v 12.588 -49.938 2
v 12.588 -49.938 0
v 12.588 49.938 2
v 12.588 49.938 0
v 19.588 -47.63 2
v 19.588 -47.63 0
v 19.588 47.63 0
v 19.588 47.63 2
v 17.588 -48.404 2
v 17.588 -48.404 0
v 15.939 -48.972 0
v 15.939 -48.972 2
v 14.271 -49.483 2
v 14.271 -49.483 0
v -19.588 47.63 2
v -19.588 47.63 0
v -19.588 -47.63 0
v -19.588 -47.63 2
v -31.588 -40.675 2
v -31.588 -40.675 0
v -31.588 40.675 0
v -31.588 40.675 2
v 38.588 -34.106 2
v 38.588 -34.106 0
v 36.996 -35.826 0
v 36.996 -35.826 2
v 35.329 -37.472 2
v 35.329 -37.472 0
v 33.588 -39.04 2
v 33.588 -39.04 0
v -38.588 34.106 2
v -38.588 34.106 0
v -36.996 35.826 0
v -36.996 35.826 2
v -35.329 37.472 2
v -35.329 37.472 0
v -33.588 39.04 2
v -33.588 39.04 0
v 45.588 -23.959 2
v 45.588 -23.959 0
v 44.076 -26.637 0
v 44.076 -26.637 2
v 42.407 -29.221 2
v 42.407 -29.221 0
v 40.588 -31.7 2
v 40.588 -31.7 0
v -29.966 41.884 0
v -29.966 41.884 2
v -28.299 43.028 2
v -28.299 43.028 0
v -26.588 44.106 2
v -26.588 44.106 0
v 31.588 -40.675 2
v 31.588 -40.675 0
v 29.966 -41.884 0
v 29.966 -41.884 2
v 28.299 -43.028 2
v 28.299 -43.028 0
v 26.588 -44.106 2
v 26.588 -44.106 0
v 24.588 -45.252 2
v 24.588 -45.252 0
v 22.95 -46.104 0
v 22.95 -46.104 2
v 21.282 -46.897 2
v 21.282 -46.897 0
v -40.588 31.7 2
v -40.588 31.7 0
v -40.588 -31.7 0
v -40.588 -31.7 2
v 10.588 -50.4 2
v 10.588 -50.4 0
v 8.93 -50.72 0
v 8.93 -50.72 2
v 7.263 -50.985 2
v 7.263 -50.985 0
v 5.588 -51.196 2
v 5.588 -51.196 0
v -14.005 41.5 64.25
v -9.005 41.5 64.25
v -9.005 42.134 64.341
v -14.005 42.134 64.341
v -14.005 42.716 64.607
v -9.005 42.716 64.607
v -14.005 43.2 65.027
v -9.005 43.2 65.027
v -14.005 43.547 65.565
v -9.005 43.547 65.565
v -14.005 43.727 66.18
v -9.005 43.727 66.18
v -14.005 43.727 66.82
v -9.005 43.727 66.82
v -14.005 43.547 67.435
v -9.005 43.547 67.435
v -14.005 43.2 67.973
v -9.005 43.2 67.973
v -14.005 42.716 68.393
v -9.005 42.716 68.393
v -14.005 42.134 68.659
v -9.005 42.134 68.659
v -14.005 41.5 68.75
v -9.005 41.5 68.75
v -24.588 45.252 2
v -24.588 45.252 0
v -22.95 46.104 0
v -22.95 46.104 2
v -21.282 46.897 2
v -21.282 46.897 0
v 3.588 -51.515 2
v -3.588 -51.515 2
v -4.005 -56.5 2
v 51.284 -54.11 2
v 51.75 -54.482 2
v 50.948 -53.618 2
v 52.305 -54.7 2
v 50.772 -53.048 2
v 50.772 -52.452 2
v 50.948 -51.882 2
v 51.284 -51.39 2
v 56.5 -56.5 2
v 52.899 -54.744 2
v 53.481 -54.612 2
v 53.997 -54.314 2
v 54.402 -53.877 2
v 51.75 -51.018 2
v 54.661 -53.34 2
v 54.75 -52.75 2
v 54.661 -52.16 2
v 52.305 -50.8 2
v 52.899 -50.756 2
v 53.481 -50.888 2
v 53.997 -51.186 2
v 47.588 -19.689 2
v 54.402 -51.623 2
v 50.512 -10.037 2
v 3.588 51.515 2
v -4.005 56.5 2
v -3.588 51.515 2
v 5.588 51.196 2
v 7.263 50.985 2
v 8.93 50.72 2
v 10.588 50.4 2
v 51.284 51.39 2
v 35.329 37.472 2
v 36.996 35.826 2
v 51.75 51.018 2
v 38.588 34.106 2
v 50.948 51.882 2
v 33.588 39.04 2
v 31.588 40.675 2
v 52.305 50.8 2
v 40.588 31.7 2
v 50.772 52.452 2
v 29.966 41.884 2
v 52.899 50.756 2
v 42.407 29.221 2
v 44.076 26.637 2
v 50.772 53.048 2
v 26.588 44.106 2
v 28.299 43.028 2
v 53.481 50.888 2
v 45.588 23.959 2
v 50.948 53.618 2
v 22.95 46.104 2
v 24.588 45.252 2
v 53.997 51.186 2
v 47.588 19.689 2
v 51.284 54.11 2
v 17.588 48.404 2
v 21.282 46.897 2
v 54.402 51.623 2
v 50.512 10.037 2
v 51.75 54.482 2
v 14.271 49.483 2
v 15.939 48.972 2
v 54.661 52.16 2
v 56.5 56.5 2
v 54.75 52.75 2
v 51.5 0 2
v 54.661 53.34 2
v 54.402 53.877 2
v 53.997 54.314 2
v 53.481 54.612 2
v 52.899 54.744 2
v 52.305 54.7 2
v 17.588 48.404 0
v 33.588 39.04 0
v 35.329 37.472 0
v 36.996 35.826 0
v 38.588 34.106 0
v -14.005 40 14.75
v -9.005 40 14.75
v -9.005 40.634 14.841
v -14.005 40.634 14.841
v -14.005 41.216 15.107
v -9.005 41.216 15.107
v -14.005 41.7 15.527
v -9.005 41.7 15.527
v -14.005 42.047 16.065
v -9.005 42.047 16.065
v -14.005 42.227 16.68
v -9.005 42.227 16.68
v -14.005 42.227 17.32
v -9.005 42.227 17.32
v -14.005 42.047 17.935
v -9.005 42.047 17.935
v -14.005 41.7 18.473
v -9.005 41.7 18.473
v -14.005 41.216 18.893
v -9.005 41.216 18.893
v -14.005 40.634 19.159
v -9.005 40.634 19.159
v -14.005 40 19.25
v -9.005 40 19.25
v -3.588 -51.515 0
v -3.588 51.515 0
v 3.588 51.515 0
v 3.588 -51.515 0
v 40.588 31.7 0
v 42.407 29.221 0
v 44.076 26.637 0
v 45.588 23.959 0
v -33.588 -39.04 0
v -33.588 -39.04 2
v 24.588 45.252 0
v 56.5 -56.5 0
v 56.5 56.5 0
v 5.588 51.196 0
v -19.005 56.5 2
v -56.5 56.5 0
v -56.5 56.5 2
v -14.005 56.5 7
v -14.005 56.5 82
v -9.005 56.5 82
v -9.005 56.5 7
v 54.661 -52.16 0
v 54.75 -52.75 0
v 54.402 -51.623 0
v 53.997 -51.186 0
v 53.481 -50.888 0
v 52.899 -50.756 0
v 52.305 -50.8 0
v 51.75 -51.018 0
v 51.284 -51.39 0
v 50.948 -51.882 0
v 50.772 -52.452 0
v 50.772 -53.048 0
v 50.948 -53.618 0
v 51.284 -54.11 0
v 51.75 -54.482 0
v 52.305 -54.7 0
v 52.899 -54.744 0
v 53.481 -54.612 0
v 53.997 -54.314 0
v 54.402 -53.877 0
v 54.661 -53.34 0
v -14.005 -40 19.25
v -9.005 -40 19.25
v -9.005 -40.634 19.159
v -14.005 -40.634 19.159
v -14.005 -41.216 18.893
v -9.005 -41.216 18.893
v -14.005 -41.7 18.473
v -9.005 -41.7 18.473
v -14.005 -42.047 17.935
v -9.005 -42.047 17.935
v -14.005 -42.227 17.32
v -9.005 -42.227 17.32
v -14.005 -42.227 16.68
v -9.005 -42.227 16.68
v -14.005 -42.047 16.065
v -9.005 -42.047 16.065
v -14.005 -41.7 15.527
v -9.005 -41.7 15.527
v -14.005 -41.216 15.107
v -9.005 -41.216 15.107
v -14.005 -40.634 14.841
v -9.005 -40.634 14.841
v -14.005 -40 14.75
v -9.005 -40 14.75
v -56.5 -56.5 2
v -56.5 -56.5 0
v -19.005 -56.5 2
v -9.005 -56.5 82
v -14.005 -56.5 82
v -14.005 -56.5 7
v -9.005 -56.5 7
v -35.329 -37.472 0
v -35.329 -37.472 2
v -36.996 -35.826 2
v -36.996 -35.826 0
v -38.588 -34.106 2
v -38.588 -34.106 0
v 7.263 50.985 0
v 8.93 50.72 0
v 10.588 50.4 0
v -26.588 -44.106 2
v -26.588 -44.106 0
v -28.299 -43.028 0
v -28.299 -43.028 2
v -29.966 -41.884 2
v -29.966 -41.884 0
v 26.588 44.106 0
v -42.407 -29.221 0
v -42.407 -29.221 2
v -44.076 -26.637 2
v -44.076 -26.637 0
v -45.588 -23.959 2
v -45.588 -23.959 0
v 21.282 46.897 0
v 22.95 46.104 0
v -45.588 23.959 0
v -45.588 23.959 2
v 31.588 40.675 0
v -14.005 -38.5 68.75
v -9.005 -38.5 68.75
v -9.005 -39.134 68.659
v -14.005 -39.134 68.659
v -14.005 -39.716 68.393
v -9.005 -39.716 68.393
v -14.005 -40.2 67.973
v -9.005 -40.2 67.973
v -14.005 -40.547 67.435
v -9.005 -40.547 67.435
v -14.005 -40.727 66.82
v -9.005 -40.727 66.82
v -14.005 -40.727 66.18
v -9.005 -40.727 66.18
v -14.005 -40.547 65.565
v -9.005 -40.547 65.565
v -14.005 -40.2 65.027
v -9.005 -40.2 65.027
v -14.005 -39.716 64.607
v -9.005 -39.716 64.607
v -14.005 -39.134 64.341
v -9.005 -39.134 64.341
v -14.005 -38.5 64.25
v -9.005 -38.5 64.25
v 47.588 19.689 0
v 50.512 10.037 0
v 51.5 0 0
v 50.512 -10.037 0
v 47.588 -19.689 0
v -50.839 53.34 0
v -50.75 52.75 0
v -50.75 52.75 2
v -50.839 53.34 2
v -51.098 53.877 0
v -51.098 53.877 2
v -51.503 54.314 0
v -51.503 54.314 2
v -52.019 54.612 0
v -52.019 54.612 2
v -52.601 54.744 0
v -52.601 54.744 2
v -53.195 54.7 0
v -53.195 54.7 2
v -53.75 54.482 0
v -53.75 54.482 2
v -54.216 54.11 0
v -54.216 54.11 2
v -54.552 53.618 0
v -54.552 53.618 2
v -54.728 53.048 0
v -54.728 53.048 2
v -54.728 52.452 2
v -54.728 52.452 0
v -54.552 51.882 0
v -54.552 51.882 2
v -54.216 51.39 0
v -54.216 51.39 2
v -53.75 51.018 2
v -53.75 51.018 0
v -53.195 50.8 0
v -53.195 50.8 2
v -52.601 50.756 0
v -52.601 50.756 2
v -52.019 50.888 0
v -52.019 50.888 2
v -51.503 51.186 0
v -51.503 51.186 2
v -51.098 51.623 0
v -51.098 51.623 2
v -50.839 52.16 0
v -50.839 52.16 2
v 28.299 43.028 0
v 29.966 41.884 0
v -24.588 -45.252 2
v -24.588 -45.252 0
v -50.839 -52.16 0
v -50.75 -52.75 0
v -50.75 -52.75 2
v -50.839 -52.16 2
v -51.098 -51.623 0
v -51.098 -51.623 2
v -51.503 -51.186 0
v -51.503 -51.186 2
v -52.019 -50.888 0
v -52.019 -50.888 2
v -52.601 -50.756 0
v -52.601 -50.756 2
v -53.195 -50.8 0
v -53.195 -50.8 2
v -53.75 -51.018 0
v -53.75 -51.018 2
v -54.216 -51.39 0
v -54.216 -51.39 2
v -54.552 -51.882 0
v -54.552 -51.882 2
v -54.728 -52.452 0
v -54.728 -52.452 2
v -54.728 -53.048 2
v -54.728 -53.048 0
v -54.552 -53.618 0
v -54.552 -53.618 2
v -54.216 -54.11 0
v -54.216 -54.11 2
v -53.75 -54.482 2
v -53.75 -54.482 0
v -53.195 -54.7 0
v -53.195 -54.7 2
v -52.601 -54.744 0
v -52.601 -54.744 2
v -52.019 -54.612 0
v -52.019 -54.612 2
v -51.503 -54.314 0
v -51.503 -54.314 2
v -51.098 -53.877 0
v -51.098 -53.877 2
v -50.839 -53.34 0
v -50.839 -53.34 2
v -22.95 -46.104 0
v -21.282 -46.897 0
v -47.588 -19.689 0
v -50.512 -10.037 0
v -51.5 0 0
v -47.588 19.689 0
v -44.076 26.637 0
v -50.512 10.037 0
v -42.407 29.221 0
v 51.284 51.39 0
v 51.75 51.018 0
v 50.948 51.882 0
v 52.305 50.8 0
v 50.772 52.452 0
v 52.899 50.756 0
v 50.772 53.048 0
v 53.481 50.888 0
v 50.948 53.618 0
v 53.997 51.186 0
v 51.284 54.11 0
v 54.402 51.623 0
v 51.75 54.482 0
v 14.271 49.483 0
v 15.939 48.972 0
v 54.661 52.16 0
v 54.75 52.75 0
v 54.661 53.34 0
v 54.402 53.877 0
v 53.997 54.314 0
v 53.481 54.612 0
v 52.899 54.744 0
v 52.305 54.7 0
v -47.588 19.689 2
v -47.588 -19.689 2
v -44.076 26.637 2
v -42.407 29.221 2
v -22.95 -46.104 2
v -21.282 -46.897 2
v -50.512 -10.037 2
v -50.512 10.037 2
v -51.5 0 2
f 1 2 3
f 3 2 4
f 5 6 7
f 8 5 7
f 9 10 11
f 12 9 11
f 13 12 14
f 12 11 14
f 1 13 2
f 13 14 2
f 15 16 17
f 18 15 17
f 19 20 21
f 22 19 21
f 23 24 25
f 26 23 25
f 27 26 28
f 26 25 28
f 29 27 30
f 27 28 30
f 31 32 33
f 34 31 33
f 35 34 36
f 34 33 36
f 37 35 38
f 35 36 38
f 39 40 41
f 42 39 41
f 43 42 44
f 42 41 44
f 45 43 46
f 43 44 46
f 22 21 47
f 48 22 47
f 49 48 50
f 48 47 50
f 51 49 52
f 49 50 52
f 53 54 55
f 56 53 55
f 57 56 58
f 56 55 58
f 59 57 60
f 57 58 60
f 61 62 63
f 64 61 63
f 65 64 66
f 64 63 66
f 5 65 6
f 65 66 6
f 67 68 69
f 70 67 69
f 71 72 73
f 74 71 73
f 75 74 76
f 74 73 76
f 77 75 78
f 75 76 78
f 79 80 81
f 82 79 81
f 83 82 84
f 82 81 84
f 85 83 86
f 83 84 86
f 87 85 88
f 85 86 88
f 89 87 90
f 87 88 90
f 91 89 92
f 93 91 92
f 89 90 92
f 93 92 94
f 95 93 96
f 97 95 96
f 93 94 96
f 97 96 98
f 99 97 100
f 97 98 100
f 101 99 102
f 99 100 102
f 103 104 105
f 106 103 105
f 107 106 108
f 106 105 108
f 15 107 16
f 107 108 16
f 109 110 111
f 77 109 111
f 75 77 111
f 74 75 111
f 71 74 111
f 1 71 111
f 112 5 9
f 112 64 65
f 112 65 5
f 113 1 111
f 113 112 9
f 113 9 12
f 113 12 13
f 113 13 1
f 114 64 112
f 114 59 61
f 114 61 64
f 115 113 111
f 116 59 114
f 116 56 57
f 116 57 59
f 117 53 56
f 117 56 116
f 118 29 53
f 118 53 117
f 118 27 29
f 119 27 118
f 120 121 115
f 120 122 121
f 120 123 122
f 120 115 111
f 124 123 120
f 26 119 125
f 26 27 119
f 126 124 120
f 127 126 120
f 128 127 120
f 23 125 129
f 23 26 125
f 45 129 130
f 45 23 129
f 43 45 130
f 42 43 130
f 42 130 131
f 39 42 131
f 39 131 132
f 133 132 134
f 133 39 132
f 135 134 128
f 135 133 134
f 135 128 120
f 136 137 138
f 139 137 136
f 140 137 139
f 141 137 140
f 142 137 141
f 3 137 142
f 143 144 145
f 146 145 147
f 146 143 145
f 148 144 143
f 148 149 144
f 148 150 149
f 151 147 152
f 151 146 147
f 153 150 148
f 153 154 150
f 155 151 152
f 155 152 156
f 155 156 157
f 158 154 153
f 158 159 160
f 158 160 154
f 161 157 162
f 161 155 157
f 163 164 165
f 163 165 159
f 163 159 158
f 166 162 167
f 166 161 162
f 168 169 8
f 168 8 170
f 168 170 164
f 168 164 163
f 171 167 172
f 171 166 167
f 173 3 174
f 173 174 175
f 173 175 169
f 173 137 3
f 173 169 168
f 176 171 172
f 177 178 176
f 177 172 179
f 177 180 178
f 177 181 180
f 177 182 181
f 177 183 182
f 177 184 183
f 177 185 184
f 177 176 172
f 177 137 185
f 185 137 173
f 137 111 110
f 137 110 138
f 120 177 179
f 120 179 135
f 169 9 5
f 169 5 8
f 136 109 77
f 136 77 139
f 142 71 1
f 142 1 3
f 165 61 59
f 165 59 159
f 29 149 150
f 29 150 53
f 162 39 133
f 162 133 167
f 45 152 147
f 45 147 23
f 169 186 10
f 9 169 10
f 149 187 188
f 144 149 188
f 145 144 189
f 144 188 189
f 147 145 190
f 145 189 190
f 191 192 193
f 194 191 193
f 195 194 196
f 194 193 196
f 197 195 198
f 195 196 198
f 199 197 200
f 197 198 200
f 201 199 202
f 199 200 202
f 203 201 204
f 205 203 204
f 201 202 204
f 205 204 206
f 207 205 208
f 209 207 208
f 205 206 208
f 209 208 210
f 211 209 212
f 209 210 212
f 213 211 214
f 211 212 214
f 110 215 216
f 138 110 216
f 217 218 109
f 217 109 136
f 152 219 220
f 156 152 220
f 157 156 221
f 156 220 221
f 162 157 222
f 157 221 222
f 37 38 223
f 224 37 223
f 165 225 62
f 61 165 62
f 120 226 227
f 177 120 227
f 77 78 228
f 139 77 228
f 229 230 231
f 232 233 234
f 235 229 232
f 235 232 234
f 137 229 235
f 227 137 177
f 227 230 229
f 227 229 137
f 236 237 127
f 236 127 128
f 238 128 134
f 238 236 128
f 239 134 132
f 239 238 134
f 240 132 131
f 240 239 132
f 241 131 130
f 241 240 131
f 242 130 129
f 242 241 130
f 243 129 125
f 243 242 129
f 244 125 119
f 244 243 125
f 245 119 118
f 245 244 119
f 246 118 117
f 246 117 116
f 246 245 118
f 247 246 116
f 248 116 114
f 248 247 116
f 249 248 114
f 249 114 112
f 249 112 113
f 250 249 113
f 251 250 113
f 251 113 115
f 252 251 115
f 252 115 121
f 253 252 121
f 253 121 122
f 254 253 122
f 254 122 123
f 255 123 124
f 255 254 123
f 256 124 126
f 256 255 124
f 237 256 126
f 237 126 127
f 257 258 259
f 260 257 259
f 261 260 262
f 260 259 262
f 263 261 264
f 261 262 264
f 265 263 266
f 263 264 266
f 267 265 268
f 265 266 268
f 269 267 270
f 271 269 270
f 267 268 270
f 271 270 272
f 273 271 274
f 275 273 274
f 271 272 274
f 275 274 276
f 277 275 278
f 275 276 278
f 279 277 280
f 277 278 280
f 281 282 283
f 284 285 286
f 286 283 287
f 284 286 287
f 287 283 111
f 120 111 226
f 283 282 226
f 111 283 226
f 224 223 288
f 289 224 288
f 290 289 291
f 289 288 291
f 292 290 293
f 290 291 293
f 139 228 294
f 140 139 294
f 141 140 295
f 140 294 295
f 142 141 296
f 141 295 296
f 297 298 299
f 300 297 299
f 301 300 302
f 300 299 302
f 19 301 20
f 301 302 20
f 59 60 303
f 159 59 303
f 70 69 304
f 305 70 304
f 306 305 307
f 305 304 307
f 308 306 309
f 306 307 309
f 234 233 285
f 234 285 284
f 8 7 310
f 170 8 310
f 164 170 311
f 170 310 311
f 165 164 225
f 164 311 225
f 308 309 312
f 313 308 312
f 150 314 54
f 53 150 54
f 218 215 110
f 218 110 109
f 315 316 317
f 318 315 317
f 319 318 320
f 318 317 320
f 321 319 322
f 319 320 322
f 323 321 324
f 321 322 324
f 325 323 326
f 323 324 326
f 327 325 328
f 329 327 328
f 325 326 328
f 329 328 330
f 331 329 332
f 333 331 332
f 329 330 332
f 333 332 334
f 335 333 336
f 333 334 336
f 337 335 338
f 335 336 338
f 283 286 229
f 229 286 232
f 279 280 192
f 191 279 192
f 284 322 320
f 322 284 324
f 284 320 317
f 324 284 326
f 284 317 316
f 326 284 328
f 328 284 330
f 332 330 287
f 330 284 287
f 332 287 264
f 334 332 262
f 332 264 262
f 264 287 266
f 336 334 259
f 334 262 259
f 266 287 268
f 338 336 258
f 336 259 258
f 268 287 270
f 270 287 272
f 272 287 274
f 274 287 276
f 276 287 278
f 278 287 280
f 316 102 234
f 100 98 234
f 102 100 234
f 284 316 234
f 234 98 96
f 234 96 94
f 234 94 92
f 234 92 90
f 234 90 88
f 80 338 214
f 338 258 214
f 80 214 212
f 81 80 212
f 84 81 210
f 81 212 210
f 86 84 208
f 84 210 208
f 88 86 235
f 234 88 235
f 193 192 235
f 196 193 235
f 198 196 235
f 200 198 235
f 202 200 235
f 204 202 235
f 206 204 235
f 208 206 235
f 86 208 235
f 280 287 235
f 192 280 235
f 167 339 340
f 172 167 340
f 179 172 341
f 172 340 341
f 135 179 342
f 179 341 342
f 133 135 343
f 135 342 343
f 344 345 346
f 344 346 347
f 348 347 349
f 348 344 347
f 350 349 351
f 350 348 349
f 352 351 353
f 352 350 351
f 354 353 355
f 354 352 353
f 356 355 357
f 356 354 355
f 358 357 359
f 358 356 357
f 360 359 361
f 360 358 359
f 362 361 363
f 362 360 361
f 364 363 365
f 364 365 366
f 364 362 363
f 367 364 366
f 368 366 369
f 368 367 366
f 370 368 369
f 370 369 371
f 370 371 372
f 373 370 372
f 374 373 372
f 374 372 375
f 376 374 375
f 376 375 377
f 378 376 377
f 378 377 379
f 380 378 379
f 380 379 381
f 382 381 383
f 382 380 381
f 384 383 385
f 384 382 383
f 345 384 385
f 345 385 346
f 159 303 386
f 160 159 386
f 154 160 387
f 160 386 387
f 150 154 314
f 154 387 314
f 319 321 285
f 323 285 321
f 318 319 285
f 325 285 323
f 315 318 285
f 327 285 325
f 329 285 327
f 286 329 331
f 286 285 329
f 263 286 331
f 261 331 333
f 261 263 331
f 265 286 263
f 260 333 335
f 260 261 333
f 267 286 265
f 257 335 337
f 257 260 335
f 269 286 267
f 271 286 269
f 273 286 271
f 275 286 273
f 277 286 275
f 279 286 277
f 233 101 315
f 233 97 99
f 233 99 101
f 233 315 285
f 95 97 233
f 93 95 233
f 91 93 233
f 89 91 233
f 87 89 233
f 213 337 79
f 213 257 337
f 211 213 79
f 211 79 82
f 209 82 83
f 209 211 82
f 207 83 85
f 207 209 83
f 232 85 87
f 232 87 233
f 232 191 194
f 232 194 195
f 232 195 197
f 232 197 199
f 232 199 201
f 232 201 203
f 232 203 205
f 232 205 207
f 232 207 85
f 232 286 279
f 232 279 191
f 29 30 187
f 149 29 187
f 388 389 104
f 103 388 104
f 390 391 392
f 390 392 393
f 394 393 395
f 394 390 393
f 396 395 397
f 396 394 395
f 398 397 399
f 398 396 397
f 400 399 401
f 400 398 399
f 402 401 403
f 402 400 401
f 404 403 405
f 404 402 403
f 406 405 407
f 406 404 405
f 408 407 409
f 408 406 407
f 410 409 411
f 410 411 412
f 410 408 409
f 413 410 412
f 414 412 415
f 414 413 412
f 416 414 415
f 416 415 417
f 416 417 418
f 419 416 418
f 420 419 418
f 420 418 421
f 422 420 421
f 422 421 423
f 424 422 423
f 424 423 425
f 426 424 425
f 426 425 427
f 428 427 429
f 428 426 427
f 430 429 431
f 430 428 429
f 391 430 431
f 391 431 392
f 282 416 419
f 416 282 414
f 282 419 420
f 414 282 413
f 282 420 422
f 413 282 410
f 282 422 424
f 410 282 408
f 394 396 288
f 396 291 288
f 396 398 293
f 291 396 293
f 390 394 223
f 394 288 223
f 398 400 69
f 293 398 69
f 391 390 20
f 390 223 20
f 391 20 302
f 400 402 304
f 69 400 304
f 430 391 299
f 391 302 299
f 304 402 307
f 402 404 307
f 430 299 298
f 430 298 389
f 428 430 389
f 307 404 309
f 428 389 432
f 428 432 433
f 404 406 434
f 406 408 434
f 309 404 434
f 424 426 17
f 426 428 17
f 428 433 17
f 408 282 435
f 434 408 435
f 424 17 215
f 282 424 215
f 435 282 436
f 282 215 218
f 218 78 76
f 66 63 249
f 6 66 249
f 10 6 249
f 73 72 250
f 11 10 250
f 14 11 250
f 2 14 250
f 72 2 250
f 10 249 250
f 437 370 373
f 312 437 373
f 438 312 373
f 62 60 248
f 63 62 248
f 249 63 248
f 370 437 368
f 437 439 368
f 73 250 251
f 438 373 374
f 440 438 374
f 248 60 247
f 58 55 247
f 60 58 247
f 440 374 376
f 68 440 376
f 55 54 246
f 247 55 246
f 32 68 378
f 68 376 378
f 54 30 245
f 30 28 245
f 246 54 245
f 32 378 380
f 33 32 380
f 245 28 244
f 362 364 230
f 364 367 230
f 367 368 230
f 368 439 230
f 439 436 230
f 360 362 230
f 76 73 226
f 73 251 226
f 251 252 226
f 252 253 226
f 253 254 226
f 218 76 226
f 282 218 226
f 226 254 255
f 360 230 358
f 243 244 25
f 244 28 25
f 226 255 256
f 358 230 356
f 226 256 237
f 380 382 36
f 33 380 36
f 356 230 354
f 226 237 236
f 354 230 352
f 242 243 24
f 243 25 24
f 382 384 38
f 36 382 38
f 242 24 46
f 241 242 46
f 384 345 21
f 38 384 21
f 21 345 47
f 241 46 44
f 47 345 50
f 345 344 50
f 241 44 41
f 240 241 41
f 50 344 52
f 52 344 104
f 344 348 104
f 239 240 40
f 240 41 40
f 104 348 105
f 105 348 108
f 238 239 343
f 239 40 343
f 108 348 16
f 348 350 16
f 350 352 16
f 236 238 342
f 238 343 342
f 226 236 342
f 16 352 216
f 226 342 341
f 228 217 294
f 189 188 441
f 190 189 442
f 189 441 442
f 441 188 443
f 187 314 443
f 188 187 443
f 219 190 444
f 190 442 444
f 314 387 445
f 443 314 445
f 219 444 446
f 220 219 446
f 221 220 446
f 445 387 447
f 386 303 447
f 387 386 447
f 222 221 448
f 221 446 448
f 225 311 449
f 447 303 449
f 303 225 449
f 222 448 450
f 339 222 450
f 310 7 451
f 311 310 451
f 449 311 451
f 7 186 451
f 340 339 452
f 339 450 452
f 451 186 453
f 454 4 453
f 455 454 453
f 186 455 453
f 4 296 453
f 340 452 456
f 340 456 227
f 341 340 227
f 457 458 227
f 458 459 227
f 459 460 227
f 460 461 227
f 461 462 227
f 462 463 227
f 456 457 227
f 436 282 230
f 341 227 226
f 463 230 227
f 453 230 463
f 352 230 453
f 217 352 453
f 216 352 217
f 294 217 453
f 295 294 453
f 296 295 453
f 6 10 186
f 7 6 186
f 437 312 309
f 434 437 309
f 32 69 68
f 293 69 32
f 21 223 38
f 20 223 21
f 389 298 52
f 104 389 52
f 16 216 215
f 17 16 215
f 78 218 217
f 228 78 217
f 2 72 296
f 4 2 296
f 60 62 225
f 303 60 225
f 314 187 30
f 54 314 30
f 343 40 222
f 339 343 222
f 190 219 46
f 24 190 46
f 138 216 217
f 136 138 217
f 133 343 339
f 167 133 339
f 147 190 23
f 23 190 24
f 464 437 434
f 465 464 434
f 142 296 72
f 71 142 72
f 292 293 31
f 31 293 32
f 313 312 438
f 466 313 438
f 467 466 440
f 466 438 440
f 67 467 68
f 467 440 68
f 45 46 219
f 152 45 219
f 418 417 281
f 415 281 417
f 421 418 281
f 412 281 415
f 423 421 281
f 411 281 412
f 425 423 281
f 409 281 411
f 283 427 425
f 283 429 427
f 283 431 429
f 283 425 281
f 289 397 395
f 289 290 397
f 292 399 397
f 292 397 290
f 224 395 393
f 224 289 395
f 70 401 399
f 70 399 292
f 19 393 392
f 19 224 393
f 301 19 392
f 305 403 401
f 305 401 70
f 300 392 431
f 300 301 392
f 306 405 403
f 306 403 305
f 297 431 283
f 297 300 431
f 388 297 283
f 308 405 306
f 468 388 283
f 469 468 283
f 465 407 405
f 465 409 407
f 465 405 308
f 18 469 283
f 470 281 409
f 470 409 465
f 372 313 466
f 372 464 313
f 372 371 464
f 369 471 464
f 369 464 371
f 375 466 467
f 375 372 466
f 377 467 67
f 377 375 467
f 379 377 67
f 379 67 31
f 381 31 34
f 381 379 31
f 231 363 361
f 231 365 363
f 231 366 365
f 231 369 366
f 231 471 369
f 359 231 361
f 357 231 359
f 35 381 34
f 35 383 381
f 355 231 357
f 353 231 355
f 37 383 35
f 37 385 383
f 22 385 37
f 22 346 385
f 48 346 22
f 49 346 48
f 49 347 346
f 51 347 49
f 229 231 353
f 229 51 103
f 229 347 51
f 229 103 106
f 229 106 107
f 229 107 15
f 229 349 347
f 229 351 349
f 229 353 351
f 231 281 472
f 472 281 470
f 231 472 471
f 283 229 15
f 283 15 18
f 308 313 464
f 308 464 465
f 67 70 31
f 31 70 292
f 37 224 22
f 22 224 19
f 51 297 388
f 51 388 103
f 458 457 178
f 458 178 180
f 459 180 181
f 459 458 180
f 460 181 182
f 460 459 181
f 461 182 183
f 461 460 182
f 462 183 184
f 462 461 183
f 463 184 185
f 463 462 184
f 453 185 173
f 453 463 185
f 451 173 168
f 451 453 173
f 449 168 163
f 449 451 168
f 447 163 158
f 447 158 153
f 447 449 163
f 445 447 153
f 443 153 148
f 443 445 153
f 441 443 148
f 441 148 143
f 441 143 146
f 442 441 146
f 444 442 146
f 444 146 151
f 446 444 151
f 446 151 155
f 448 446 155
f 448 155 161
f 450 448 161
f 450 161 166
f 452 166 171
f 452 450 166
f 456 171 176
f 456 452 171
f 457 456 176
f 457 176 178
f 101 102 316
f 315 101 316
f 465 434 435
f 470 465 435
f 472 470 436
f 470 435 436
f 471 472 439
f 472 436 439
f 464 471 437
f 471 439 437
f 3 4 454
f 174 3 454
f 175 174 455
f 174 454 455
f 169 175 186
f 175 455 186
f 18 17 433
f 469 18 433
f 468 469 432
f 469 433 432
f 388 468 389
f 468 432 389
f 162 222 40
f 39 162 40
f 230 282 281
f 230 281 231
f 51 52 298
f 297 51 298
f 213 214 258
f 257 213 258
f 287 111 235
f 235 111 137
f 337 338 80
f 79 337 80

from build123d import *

# Parameters (mm, degrees)
F0_W     = 113
F0_H     = 113
F0_R     = 2
F0_W_2   = 7.1751601063
F0_H_2   = 103.030346334
F1_DEPTH = 2
F2_W     = 5
F2_H     = 113
F3_DEPTH = 80
F5_DEPTH = 25
F6_SIZE  = 5


with BuildPart() as f1:
    # F0 (on Top) → F1 (new body)
    with BuildSketch(Plane.XY):
        Rectangle(F0_W, F0_H)
        with Locations((-52.75, -52.75)):
            Circle(F0_R, mode=Mode.SUBTRACT)
        with BuildLine():
            ThreePointArc((-47.5875800531, -19.6893937105), (-51.5, 0), (-47.5875800531, 19.6893937105))
            Line((-47.5875800531, 19.6893937105), (-47.5875800531, -19.6893937105))
        make_face(mode=Mode.SUBTRACT)
        with Locations((52.75, -52.75)):
            Circle(F0_R, mode=Mode.SUBTRACT)
        with BuildLine():
            Line((45.5875800531, 23.9587675998), (45.5875800531, -23.9587675998))
            ThreePointArc((45.5875800531, -23.9587675998), (43.2610879903, -27.9415150967), (40.5875800531, -31.7001316311))
            Line((40.5875800531, -31.7001316311), (40.5875800531, 31.7001316311))
            ThreePointArc((40.5875800531, 31.7001316311), (43.2610879903, 27.9415150967), (45.5875800531, 23.9587675998))
        make_face(mode=Mode.SUBTRACT)
        with BuildLine():
            Line((-45.5875800531, -23.9587675998), (-45.5875800531, 23.9587675998))
            ThreePointArc((-45.5875800531, 23.9587675998), (-43.2610879903, 27.9415150967), (-40.5875800531, 31.7001316311))
            Line((-40.5875800531, 31.7001316311), (-40.5875800531, -31.7001316311))
            ThreePointArc((-40.5875800531, -31.7001316311), (-43.2610879903, -27.9415150967), (-45.5875800531, -23.9587675998))
        make_face(mode=Mode.SUBTRACT)
        with BuildLine():
            Line((-38.5875800531, -34.106431441), (-38.5875800531, 34.106431441))
            ThreePointArc((-38.5875800531, 34.106431441), (-36.1717921774, 36.6585794962), (-33.5875800531, 39.0400367082))
            Line((-33.5875800531, 39.0400367082), (-33.5875800531, -39.0400367082))
            ThreePointArc((-33.5875800531, -39.0400367082), (-36.1717921774, -36.6585794962), (-38.5875800531, -34.106431441))
        make_face(mode=Mode.SUBTRACT)
        with BuildLine():
            Line((-31.5875800531, -40.6752355419), (-31.5875800531, 40.6752355419))
            ThreePointArc((-31.5875800531, 40.6752355419), (-29.1381205687, 42.4643371516), (-26.5875800531, 44.1061286775))
            Line((-26.5875800531, 44.1061286775), (-26.5875800531, -44.1061286775))
            ThreePointArc((-26.5875800531, -44.1061286775), (-29.1381205687, -42.4643371516), (-31.5875800531, -40.6752355419))
        make_face(mode=Mode.SUBTRACT)
        with BuildLine():
            Line((-24.5875800531, -45.2515293347), (-24.5875800531, 45.2515293347))
            ThreePointArc((-24.5875800531, 45.2515293347), (-22.1195608355, 46.5077953513), (-19.5875800531, 47.6295780756))
            Line((-19.5875800531, 47.6295780756), (-19.5875800531, -47.6295780756))
            ThreePointArc((-19.5875800531, -47.6295780756), (-22.1195608355, -46.5077953513), (-24.5875800531, -45.2515293347))
        make_face(mode=Mode.SUBTRACT)
        with Locations((-52.75, 52.75)):
            Circle(F0_R, mode=Mode.SUBTRACT)
        Rectangle(F0_W_2, F0_H_2, mode=Mode.SUBTRACT)
        with BuildLine():
            Line((5.5875800531, -51.1959856742), (5.5875800531, 51.1959856742))
            ThreePointArc((5.5875800531, 51.1959856742), (8.0973684903, 50.8594398665), (10.5875800531, 50.3999320299))
            Line((10.5875800531, 50.3999320299), (10.5875800531, -50.3999320299))
            ThreePointArc((10.5875800531, -50.3999320299), (8.0973684903, -50.8594398665), (5.5875800531, -51.1959856742))
        make_face(mode=Mode.SUBTRACT)
        with BuildLine():
            Line((17.5875800531, 48.4037914618), (17.5875800531, -48.4037914618))
            ThreePointArc((17.5875800531, -48.4037914618), (15.1070683132, -49.2344034896), (12.5875800531, -49.9379898314))
            Line((12.5875800531, -49.9379898314), (12.5875800531, 49.9379898314))
            ThreePointArc((12.5875800531, 49.9379898314), (15.1070683132, 49.2344034896), (17.5875800531, 48.4037914618))
        make_face(mode=Mode.SUBTRACT)
        with BuildLine():
            Line((24.5875800531, 45.2515293347), (24.5875800531, -45.2515293347))
            ThreePointArc((24.5875800531, -45.2515293347), (22.1195608355, -46.5077953513), (19.5875800531, -47.6295780756))
            Line((19.5875800531, -47.6295780756), (19.5875800531, 47.6295780756))
            ThreePointArc((19.5875800531, 47.6295780756), (22.1195608355, 46.5077953513), (24.5875800531, 45.2515293347))
        make_face(mode=Mode.SUBTRACT)
        with BuildLine():
            Line((26.5875800531, -44.1061286775), (26.5875800531, 44.1061286775))
            ThreePointArc((26.5875800531, 44.1061286775), (29.1381205687, 42.4643371516), (31.5875800531, 40.6752355419))
            Line((31.5875800531, 40.6752355419), (31.5875800531, -40.6752355419))
            ThreePointArc((31.5875800531, -40.6752355419), (29.1381205687, -42.4643371516), (26.5875800531, -44.1061286775))
        make_face(mode=Mode.SUBTRACT)
        with BuildLine():
            Line((33.5875800531, -39.0400367082), (33.5875800531, 39.0400367082))
            ThreePointArc((33.5875800531, 39.0400367082), (36.1717921774, 36.6585794962), (38.5875800531, 34.106431441))
            Line((38.5875800531, 34.106431441), (38.5875800531, -34.106431441))
            ThreePointArc((38.5875800531, -34.106431441), (36.1717921774, -36.6585794962), (33.5875800531, -39.0400367082))
        make_face(mode=Mode.SUBTRACT)
        with BuildLine():
            Line((47.5875800531, -19.6893937105), (47.5875800531, 19.6893937105))
            ThreePointArc((47.5875800531, 19.6893937105), (51.5, 0), (47.5875800531, -19.6893937105))
        make_face(mode=Mode.SUBTRACT)
        with Locations((52.75, 52.75)):
            Circle(F0_R, mode=Mode.SUBTRACT)
    extrude(amount=F1_DEPTH)

    # F2 (on face) → F3 (join)
    with BuildSketch(Plane.XY.offset(2)):
        with Locations((-11.5047348663, 0)):
            Rectangle(F2_W, F2_H)
    extrude(amount=F3_DEPTH)

    # F4 (on face) → F5 (cut)
    with BuildSketch(Plane.YZ.offset(-9.0047348663)):
        with BuildLine():
            Line((-35.5, 19.25), (-40, 19.25))
            ThreePointArc((-40, 19.25), (-42.25, 17), (-40, 14.75))
            Line((-40, 14.75), (-35.5, 14.75))
            Line((-35.5, 14.75), (35.5, 14.75))
            Line((35.5, 14.75), (40, 14.75))
            ThreePointArc((40, 14.75), (42.25, 17), (40, 19.25))
            Line((40, 19.25), (35.5, 19.25))
            Line((35.5, 19.25), (-35.5, 19.25))
        make_face()
        with BuildLine():
            Line((-34.5, 68.75), (-38.5, 68.75))
            ThreePointArc((-38.5, 68.75), (-40.75, 66.5), (-38.5, 64.25))
            Line((-38.5, 64.25), (-34.5, 64.25))
            Line((-34.5, 64.25), (34.5, 64.25))
            Line((34.5, 64.25), (41.5, 64.25))
            ThreePointArc((41.5, 64.25), (43.75, 66.5), (41.5, 68.75))
            Line((41.5, 68.75), (34.5, 68.75))
            Line((34.5, 68.75), (-34.5, 68.75))
        make_face()
    extrude(amount=-F5_DEPTH, mode=Mode.SUBTRACT)

    # F6
    f6_edges = [f1.edges().sort_by_distance(p)[0] for p in [
        (-9.004735, 0, 2),
        (-14.004735, 0, 2),
    ]]
    chamfer(f6_edges, length=F6_SIZE)


solid = f1.part
